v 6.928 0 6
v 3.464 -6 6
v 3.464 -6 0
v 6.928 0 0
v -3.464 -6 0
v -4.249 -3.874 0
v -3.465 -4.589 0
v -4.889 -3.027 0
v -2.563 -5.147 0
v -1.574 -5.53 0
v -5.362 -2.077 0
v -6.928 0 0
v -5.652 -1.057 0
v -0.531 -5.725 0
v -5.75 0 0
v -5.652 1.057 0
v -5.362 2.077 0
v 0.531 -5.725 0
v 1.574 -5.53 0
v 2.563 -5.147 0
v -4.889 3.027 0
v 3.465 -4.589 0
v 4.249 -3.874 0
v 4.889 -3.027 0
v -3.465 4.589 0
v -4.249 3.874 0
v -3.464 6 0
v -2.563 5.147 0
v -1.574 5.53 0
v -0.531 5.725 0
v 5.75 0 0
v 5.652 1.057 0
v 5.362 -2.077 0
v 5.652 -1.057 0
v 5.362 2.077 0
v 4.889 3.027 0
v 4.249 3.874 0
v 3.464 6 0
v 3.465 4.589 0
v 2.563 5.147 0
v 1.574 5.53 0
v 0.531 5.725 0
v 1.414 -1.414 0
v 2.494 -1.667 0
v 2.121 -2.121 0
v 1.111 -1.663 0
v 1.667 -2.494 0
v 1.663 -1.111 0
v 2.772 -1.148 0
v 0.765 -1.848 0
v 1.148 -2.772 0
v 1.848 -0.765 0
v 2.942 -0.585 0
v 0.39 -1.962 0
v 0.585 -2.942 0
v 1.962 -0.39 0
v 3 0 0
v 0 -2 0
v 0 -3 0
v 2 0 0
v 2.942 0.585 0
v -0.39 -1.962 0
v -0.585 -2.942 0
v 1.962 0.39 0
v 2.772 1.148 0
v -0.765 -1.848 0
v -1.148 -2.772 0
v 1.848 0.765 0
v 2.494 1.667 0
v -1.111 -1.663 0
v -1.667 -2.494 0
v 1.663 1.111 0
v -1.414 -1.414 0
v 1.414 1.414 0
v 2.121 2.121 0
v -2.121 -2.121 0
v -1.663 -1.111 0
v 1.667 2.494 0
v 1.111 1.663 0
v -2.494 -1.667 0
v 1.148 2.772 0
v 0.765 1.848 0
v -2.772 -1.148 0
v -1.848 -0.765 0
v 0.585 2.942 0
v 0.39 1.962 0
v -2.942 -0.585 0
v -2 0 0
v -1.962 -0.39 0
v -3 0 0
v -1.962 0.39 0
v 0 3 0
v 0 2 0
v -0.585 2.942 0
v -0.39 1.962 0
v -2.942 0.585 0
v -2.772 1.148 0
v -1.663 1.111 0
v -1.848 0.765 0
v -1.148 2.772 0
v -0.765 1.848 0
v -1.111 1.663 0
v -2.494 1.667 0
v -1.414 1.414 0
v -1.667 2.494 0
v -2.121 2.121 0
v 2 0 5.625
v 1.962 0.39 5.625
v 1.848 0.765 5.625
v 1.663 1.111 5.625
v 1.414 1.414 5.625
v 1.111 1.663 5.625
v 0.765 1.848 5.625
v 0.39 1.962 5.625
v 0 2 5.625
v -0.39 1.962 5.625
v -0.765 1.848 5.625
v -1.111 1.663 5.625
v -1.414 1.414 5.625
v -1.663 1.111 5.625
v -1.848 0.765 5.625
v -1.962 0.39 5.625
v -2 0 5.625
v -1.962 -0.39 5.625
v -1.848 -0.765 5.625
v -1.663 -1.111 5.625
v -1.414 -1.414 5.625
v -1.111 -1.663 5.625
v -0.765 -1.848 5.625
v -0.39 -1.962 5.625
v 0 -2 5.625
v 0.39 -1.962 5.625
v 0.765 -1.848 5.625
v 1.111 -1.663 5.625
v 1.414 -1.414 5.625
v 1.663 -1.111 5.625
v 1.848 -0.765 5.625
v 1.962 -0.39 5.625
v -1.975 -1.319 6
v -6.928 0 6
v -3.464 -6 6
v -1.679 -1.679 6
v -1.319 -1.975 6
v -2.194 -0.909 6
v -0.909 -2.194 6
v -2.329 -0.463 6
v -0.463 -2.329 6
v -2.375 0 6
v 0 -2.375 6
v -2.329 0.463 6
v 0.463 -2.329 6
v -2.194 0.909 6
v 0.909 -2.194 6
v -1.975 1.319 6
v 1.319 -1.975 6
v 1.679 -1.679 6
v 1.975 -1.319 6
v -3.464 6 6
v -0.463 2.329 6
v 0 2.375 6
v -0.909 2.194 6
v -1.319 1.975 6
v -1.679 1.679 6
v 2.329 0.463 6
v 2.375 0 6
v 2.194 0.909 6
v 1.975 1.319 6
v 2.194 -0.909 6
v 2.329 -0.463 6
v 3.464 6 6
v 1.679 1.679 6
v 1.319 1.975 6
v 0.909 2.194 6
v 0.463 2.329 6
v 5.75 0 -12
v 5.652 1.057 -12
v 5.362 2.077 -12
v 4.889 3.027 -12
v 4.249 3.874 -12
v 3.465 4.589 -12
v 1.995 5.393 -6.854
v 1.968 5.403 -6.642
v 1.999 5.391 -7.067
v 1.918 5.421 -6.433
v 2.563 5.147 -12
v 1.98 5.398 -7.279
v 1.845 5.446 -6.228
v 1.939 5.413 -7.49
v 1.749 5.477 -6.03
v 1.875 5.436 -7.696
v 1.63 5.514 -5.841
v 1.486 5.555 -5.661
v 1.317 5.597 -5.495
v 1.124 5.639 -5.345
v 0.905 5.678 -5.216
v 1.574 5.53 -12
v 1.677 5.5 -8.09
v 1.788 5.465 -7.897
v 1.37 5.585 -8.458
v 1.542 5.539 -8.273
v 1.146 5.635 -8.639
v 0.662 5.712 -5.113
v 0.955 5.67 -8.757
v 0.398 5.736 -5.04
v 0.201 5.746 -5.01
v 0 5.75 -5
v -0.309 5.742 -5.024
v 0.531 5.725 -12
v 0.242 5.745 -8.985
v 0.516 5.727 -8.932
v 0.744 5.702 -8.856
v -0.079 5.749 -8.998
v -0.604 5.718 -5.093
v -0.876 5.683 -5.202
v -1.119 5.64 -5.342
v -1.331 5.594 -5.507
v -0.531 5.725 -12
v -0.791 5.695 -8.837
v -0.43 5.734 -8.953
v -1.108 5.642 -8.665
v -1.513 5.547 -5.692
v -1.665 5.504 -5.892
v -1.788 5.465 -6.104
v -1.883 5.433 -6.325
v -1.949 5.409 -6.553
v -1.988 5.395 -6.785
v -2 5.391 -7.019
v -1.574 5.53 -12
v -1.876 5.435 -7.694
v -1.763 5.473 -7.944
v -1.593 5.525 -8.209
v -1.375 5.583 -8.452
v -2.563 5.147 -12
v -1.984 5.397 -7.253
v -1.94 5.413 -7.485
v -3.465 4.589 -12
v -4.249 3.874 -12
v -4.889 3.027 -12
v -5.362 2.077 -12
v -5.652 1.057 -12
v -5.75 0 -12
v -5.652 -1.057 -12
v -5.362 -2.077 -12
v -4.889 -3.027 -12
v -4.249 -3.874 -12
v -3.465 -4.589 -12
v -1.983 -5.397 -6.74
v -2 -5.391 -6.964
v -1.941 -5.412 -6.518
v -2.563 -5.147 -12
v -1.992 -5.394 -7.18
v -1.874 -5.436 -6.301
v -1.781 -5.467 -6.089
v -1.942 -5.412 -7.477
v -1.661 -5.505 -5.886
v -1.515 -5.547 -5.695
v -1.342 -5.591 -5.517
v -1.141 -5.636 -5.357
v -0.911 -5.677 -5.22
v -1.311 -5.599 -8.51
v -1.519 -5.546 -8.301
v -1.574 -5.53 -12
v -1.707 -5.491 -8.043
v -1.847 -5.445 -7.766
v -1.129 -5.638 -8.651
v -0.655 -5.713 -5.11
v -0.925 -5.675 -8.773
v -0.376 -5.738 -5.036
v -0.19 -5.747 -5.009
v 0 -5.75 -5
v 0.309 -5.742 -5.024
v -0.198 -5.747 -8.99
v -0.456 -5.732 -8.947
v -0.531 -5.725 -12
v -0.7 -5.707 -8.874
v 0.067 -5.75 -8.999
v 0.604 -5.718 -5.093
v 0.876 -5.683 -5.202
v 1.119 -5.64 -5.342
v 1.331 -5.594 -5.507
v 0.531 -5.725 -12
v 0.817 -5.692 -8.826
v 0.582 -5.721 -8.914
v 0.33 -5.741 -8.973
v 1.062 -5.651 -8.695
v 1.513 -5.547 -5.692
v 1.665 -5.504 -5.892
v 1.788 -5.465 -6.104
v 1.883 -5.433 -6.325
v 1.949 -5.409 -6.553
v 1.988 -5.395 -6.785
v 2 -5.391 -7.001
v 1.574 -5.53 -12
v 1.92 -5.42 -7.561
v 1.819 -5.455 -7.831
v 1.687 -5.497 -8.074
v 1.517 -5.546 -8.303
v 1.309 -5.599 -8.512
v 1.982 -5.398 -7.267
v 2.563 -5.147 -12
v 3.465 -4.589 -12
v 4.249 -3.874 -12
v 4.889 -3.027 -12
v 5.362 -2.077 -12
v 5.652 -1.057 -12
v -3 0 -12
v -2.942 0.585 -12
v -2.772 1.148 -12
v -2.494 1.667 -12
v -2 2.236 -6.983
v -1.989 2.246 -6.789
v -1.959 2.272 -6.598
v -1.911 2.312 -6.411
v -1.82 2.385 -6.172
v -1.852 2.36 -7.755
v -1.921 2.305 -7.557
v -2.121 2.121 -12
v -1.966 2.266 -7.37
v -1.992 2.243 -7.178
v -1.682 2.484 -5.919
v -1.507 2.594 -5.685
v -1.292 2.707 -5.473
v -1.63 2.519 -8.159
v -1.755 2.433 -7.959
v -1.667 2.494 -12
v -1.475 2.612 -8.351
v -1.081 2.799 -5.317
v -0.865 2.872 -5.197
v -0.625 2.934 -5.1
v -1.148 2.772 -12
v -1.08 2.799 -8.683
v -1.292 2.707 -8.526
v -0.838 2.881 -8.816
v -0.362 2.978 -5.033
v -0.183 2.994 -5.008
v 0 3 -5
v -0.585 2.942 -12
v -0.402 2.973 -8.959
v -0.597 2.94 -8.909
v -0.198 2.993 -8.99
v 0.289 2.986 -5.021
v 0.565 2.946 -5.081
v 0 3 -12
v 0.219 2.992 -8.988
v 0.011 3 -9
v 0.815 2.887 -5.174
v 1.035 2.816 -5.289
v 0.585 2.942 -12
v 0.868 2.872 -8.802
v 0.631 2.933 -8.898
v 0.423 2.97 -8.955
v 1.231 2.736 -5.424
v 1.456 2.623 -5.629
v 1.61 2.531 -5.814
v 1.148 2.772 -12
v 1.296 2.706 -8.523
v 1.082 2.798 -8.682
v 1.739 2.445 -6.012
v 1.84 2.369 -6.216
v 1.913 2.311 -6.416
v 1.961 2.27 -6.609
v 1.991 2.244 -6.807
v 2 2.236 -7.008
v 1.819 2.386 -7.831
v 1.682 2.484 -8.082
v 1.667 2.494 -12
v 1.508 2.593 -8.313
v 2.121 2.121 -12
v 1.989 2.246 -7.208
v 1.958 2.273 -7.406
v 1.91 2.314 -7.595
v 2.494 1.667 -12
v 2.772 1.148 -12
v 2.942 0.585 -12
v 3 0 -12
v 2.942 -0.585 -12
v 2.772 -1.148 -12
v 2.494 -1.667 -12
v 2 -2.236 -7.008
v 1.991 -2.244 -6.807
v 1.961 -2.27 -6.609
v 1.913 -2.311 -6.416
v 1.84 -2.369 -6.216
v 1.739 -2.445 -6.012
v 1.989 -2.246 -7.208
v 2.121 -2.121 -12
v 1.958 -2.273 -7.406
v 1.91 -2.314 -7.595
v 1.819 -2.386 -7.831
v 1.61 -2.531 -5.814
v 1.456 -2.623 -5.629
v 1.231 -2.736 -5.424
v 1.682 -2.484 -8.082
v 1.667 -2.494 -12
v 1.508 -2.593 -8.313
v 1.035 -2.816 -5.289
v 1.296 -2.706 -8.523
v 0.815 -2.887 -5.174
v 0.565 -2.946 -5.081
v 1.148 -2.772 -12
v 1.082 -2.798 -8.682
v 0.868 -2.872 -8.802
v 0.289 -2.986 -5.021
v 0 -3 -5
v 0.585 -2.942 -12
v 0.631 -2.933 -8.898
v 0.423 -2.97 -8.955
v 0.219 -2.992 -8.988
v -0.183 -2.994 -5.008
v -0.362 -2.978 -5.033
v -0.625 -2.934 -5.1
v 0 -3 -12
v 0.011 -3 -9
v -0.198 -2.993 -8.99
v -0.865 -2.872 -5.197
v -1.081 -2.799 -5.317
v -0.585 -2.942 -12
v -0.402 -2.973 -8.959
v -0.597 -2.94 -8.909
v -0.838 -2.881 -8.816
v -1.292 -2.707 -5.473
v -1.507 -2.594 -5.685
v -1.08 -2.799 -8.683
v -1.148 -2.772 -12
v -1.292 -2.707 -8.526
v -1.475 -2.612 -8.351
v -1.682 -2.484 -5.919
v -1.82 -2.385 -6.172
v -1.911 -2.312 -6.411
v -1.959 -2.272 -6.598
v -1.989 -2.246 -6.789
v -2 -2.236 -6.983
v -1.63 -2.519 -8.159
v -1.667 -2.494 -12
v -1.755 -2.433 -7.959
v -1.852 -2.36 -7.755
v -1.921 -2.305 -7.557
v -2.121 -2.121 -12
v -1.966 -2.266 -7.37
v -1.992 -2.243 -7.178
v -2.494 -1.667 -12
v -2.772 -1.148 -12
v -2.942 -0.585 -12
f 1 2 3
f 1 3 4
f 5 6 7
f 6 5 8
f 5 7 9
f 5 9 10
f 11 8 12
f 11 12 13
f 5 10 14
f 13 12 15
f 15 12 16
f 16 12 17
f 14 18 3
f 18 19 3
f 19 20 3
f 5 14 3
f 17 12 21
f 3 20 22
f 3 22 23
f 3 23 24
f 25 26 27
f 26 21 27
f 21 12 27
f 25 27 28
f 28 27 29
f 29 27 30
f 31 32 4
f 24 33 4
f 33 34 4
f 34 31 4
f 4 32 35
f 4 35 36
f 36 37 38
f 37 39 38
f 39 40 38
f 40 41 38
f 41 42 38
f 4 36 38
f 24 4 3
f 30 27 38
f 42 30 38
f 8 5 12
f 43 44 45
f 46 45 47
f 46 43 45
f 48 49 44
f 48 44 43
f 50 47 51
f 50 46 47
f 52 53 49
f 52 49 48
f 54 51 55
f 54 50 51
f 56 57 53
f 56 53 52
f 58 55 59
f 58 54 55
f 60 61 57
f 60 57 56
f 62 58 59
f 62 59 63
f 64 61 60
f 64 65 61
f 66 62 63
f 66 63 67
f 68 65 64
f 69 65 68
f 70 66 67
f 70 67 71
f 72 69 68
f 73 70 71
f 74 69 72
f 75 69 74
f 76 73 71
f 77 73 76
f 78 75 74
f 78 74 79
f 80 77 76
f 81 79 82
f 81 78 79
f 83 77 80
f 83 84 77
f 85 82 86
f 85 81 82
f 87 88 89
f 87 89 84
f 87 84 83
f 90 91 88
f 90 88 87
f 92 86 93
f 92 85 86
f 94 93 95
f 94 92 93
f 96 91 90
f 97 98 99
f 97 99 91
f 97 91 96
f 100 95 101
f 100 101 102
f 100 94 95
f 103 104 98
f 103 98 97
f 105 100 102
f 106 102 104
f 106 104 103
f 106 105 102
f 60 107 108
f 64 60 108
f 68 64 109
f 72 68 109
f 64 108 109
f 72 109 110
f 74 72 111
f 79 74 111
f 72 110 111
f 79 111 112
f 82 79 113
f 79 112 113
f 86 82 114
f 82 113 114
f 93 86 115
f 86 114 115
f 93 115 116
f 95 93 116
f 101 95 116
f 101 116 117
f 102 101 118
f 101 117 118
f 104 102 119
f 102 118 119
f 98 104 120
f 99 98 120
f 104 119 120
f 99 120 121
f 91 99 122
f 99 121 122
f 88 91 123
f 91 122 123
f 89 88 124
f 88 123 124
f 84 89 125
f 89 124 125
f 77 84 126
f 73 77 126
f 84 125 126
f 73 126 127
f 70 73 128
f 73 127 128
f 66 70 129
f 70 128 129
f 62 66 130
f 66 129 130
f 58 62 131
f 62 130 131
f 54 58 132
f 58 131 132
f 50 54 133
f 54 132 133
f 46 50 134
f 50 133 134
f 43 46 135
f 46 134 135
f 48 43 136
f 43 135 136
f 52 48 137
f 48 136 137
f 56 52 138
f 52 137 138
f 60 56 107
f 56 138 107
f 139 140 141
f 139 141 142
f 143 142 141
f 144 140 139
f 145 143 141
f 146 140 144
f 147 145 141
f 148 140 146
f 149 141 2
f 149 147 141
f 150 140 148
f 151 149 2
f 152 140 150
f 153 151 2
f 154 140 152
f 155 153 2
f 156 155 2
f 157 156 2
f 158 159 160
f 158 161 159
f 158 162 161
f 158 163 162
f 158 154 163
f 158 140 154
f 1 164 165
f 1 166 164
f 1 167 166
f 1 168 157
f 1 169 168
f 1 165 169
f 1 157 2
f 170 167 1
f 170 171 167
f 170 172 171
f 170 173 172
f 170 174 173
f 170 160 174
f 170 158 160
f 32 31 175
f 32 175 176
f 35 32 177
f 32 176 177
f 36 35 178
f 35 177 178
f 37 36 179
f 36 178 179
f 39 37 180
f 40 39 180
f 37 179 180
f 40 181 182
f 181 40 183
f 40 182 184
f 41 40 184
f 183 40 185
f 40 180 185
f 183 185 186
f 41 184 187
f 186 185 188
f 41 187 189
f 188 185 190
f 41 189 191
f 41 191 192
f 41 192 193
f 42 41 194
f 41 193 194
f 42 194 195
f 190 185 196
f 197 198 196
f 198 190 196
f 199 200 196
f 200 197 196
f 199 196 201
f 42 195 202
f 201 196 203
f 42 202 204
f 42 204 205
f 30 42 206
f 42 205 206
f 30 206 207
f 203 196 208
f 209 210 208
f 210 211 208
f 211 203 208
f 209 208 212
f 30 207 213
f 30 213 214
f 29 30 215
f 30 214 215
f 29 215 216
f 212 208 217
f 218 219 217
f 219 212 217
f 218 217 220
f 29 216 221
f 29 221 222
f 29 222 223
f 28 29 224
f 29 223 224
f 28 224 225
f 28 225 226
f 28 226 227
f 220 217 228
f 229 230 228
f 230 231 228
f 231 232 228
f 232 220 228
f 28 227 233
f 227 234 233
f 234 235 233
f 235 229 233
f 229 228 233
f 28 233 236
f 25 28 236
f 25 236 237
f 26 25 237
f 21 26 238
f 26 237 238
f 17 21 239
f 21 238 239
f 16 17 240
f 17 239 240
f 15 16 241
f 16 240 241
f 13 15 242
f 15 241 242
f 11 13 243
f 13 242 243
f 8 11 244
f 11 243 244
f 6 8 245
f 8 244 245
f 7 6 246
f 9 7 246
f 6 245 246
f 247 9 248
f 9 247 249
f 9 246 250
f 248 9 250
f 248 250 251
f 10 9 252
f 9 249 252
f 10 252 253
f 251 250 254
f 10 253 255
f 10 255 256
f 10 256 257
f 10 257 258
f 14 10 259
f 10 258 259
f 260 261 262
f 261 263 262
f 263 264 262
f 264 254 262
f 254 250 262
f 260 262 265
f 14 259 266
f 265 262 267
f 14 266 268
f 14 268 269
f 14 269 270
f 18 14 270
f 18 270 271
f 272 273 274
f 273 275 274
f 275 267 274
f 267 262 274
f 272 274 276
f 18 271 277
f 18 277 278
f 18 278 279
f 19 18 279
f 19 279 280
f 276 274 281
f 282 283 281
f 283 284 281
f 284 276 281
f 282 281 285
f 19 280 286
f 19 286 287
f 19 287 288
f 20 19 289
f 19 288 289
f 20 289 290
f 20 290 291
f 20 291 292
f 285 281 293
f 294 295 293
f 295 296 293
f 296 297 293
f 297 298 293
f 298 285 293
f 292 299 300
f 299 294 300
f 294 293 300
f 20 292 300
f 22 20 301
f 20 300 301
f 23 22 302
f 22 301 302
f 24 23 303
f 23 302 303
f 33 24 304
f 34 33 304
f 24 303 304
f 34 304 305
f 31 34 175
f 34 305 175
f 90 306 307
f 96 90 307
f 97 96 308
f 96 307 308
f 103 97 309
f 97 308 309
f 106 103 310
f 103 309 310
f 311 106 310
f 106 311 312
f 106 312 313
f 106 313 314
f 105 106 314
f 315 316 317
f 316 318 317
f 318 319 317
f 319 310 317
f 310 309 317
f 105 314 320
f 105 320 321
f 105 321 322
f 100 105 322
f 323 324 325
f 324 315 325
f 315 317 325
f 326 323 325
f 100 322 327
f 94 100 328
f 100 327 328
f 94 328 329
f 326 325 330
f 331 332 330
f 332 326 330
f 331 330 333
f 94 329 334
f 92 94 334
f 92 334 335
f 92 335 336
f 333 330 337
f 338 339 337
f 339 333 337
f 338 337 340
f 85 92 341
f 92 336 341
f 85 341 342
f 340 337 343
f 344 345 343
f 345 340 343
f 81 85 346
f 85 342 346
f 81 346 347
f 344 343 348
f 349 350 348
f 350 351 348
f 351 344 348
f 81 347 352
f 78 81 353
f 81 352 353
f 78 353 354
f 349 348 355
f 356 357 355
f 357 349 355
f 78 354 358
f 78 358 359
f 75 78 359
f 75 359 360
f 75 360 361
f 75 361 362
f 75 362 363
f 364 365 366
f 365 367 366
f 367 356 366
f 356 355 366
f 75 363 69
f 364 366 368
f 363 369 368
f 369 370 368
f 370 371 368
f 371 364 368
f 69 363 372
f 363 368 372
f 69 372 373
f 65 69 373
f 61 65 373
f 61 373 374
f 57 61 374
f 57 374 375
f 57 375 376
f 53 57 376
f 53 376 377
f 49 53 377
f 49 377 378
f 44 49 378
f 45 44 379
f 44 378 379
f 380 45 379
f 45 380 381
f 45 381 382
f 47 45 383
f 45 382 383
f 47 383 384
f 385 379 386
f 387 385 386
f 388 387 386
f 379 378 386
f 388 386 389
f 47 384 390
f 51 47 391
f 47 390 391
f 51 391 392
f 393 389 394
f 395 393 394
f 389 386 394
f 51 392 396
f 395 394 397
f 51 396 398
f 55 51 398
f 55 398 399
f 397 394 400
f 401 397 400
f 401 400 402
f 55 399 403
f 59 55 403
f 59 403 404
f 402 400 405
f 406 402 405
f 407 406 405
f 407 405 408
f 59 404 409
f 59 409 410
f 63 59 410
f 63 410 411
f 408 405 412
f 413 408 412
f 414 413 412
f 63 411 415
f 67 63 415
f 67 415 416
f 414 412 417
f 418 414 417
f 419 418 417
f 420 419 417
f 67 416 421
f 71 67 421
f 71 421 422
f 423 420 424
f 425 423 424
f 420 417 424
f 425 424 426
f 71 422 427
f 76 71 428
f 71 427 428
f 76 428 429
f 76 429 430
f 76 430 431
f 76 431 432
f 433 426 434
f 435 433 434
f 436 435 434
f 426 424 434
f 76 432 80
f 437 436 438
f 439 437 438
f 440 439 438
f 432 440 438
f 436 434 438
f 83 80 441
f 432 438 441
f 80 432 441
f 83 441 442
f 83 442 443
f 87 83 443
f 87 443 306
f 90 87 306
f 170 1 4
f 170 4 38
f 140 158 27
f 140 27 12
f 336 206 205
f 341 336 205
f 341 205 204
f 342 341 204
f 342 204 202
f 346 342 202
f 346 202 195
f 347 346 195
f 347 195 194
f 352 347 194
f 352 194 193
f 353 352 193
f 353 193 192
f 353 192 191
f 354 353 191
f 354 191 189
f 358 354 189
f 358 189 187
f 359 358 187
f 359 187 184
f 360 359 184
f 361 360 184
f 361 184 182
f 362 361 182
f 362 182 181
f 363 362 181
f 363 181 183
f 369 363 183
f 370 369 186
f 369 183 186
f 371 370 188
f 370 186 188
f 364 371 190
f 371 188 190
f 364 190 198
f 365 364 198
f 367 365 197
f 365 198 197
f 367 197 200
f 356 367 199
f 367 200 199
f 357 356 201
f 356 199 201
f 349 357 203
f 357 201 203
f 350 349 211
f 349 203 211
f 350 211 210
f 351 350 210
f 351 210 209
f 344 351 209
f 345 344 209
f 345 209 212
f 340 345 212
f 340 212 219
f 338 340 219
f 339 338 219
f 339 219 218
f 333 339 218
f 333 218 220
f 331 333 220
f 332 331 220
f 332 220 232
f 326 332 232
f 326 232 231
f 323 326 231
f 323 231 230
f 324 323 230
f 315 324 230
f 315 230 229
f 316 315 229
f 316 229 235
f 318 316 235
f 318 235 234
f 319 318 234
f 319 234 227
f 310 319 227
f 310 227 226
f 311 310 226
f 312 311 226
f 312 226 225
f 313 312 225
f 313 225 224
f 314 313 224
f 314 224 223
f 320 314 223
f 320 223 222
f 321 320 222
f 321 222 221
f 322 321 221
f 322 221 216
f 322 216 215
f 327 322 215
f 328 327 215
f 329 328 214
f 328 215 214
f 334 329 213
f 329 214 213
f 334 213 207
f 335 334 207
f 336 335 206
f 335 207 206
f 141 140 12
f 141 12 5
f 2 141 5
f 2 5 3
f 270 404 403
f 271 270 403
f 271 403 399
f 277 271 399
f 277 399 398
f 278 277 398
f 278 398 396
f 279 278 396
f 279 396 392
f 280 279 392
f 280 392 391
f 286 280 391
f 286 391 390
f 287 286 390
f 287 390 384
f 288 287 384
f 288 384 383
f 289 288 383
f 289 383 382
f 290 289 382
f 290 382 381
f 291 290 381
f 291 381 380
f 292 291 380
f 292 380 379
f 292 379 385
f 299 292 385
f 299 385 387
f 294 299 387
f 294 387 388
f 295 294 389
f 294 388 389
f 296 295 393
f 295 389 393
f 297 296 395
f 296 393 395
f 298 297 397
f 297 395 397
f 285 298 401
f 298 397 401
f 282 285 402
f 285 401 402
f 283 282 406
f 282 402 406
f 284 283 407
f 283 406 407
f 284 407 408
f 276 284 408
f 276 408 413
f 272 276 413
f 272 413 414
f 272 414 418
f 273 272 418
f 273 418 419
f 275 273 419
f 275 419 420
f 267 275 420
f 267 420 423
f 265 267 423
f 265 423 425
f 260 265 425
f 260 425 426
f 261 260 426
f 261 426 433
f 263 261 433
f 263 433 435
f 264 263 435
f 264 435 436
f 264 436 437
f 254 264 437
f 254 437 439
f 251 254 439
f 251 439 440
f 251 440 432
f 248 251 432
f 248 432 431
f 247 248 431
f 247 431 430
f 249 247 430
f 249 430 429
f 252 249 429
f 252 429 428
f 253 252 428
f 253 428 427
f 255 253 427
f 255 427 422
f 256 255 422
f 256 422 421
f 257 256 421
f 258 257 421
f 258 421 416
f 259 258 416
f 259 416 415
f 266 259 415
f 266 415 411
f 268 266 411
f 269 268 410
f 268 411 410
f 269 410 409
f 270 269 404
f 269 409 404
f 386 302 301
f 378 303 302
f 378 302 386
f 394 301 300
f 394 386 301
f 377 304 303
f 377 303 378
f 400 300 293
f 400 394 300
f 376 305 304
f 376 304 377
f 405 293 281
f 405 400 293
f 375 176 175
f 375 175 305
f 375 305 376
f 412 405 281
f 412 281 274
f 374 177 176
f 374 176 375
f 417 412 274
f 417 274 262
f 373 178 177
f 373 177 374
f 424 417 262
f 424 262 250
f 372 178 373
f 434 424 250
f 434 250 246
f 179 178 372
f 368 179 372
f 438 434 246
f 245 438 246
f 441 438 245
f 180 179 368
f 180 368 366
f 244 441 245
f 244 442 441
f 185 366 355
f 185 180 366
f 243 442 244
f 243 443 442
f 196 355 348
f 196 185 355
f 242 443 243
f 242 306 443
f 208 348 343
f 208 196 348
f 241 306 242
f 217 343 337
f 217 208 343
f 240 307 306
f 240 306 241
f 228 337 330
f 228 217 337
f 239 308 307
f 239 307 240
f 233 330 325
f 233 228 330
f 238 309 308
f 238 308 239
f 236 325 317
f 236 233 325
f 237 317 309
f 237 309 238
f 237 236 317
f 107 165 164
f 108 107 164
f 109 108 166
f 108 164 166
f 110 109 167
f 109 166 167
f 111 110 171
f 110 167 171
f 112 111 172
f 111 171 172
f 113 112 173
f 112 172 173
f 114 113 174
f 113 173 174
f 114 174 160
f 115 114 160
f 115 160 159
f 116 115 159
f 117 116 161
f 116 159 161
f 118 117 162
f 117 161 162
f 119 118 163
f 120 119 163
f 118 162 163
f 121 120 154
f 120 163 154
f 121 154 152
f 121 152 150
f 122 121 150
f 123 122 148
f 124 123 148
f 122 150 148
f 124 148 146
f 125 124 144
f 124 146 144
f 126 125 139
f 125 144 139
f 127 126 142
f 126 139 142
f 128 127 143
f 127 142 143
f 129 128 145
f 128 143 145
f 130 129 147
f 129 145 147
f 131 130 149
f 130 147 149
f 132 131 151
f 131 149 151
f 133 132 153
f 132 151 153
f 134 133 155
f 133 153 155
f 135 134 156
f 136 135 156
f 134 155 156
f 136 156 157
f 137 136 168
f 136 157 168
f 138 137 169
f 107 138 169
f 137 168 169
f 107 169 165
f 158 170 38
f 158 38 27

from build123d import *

# Parameters (mm, degrees)
EXTRUDE_1_DEPTH              = 6
SKETCH_2_W                   = 5.75
SKETCH_2_H                   = 12
HOLE_WIZARD_M4_1_D           = 4
HOLE_WIZARD_M4_1_CBORE_D     = 6
HOLE_WIZARD_M4_1_CBORE_DEPTH = 12
SKETCH_7_R                   = 2
CUT_EXTRUDE_1_DEPTH          = 19.167622299
CHAMFER_1_SIZE               = 0.375


with BuildPart() as part:
    # 草图1 → 凸台-拉伸1 (new body)
    with BuildSketch(Plane.XY.offset(6)):
        Polygon((-3.464101615, -6), (3.464101615, -6), (6.92820323, 0), (3.464101615, 6), (-3.464101615, 6), (-6.92820323, 0), align=None)
    extrude(amount=-EXTRUDE_1_DEPTH)

    # 草图2 → 旋转1 (revolve)
    with BuildSketch(Plane(origin=(0, 0, 0), x_dir=(1, 0, 0), z_dir=(0, 1, 0))):
        with Locations((2.875, 6)):
            Rectangle(SKETCH_2_W, SKETCH_2_H)
    revolve(axis=Axis((0, 0, -12), (0, 0, 1)))

    # M4 六角头机械螺钉的柱形沉头孔1 (through all)
    with Locations(Plane(origin=(0, 0, -12), x_dir=(-1, 0, 0), z_dir=(0, 0, -1))):
        with Locations((0, 0)):
            CounterBoreHole(HOLE_WIZARD_M4_1_D / 2, HOLE_WIZARD_M4_1_CBORE_D / 2, HOLE_WIZARD_M4_1_CBORE_DEPTH)

    # 草图7 → 切除-拉伸1 (cut, through all)
    with BuildSketch(Plane(origin=(0, 5.75, 0), x_dir=(1, 0, 0), z_dir=(0, 1, 0))):
        with Locations(Location((0, 7, 0), (0, 0, 270))):
            Circle(SKETCH_7_R)
    extrude(amount=-CUT_EXTRUDE_1_DEPTH, mode=Mode.SUBTRACT)

    # 倒角1
    chamfer_1_edges = [part.edges().sort_by_distance(p)[0] for p in [
        (-2, 0, 6),
    ]]
    chamfer(chamfer_1_edges, length=CHAMFER_1_SIZE)


solid = part.part
